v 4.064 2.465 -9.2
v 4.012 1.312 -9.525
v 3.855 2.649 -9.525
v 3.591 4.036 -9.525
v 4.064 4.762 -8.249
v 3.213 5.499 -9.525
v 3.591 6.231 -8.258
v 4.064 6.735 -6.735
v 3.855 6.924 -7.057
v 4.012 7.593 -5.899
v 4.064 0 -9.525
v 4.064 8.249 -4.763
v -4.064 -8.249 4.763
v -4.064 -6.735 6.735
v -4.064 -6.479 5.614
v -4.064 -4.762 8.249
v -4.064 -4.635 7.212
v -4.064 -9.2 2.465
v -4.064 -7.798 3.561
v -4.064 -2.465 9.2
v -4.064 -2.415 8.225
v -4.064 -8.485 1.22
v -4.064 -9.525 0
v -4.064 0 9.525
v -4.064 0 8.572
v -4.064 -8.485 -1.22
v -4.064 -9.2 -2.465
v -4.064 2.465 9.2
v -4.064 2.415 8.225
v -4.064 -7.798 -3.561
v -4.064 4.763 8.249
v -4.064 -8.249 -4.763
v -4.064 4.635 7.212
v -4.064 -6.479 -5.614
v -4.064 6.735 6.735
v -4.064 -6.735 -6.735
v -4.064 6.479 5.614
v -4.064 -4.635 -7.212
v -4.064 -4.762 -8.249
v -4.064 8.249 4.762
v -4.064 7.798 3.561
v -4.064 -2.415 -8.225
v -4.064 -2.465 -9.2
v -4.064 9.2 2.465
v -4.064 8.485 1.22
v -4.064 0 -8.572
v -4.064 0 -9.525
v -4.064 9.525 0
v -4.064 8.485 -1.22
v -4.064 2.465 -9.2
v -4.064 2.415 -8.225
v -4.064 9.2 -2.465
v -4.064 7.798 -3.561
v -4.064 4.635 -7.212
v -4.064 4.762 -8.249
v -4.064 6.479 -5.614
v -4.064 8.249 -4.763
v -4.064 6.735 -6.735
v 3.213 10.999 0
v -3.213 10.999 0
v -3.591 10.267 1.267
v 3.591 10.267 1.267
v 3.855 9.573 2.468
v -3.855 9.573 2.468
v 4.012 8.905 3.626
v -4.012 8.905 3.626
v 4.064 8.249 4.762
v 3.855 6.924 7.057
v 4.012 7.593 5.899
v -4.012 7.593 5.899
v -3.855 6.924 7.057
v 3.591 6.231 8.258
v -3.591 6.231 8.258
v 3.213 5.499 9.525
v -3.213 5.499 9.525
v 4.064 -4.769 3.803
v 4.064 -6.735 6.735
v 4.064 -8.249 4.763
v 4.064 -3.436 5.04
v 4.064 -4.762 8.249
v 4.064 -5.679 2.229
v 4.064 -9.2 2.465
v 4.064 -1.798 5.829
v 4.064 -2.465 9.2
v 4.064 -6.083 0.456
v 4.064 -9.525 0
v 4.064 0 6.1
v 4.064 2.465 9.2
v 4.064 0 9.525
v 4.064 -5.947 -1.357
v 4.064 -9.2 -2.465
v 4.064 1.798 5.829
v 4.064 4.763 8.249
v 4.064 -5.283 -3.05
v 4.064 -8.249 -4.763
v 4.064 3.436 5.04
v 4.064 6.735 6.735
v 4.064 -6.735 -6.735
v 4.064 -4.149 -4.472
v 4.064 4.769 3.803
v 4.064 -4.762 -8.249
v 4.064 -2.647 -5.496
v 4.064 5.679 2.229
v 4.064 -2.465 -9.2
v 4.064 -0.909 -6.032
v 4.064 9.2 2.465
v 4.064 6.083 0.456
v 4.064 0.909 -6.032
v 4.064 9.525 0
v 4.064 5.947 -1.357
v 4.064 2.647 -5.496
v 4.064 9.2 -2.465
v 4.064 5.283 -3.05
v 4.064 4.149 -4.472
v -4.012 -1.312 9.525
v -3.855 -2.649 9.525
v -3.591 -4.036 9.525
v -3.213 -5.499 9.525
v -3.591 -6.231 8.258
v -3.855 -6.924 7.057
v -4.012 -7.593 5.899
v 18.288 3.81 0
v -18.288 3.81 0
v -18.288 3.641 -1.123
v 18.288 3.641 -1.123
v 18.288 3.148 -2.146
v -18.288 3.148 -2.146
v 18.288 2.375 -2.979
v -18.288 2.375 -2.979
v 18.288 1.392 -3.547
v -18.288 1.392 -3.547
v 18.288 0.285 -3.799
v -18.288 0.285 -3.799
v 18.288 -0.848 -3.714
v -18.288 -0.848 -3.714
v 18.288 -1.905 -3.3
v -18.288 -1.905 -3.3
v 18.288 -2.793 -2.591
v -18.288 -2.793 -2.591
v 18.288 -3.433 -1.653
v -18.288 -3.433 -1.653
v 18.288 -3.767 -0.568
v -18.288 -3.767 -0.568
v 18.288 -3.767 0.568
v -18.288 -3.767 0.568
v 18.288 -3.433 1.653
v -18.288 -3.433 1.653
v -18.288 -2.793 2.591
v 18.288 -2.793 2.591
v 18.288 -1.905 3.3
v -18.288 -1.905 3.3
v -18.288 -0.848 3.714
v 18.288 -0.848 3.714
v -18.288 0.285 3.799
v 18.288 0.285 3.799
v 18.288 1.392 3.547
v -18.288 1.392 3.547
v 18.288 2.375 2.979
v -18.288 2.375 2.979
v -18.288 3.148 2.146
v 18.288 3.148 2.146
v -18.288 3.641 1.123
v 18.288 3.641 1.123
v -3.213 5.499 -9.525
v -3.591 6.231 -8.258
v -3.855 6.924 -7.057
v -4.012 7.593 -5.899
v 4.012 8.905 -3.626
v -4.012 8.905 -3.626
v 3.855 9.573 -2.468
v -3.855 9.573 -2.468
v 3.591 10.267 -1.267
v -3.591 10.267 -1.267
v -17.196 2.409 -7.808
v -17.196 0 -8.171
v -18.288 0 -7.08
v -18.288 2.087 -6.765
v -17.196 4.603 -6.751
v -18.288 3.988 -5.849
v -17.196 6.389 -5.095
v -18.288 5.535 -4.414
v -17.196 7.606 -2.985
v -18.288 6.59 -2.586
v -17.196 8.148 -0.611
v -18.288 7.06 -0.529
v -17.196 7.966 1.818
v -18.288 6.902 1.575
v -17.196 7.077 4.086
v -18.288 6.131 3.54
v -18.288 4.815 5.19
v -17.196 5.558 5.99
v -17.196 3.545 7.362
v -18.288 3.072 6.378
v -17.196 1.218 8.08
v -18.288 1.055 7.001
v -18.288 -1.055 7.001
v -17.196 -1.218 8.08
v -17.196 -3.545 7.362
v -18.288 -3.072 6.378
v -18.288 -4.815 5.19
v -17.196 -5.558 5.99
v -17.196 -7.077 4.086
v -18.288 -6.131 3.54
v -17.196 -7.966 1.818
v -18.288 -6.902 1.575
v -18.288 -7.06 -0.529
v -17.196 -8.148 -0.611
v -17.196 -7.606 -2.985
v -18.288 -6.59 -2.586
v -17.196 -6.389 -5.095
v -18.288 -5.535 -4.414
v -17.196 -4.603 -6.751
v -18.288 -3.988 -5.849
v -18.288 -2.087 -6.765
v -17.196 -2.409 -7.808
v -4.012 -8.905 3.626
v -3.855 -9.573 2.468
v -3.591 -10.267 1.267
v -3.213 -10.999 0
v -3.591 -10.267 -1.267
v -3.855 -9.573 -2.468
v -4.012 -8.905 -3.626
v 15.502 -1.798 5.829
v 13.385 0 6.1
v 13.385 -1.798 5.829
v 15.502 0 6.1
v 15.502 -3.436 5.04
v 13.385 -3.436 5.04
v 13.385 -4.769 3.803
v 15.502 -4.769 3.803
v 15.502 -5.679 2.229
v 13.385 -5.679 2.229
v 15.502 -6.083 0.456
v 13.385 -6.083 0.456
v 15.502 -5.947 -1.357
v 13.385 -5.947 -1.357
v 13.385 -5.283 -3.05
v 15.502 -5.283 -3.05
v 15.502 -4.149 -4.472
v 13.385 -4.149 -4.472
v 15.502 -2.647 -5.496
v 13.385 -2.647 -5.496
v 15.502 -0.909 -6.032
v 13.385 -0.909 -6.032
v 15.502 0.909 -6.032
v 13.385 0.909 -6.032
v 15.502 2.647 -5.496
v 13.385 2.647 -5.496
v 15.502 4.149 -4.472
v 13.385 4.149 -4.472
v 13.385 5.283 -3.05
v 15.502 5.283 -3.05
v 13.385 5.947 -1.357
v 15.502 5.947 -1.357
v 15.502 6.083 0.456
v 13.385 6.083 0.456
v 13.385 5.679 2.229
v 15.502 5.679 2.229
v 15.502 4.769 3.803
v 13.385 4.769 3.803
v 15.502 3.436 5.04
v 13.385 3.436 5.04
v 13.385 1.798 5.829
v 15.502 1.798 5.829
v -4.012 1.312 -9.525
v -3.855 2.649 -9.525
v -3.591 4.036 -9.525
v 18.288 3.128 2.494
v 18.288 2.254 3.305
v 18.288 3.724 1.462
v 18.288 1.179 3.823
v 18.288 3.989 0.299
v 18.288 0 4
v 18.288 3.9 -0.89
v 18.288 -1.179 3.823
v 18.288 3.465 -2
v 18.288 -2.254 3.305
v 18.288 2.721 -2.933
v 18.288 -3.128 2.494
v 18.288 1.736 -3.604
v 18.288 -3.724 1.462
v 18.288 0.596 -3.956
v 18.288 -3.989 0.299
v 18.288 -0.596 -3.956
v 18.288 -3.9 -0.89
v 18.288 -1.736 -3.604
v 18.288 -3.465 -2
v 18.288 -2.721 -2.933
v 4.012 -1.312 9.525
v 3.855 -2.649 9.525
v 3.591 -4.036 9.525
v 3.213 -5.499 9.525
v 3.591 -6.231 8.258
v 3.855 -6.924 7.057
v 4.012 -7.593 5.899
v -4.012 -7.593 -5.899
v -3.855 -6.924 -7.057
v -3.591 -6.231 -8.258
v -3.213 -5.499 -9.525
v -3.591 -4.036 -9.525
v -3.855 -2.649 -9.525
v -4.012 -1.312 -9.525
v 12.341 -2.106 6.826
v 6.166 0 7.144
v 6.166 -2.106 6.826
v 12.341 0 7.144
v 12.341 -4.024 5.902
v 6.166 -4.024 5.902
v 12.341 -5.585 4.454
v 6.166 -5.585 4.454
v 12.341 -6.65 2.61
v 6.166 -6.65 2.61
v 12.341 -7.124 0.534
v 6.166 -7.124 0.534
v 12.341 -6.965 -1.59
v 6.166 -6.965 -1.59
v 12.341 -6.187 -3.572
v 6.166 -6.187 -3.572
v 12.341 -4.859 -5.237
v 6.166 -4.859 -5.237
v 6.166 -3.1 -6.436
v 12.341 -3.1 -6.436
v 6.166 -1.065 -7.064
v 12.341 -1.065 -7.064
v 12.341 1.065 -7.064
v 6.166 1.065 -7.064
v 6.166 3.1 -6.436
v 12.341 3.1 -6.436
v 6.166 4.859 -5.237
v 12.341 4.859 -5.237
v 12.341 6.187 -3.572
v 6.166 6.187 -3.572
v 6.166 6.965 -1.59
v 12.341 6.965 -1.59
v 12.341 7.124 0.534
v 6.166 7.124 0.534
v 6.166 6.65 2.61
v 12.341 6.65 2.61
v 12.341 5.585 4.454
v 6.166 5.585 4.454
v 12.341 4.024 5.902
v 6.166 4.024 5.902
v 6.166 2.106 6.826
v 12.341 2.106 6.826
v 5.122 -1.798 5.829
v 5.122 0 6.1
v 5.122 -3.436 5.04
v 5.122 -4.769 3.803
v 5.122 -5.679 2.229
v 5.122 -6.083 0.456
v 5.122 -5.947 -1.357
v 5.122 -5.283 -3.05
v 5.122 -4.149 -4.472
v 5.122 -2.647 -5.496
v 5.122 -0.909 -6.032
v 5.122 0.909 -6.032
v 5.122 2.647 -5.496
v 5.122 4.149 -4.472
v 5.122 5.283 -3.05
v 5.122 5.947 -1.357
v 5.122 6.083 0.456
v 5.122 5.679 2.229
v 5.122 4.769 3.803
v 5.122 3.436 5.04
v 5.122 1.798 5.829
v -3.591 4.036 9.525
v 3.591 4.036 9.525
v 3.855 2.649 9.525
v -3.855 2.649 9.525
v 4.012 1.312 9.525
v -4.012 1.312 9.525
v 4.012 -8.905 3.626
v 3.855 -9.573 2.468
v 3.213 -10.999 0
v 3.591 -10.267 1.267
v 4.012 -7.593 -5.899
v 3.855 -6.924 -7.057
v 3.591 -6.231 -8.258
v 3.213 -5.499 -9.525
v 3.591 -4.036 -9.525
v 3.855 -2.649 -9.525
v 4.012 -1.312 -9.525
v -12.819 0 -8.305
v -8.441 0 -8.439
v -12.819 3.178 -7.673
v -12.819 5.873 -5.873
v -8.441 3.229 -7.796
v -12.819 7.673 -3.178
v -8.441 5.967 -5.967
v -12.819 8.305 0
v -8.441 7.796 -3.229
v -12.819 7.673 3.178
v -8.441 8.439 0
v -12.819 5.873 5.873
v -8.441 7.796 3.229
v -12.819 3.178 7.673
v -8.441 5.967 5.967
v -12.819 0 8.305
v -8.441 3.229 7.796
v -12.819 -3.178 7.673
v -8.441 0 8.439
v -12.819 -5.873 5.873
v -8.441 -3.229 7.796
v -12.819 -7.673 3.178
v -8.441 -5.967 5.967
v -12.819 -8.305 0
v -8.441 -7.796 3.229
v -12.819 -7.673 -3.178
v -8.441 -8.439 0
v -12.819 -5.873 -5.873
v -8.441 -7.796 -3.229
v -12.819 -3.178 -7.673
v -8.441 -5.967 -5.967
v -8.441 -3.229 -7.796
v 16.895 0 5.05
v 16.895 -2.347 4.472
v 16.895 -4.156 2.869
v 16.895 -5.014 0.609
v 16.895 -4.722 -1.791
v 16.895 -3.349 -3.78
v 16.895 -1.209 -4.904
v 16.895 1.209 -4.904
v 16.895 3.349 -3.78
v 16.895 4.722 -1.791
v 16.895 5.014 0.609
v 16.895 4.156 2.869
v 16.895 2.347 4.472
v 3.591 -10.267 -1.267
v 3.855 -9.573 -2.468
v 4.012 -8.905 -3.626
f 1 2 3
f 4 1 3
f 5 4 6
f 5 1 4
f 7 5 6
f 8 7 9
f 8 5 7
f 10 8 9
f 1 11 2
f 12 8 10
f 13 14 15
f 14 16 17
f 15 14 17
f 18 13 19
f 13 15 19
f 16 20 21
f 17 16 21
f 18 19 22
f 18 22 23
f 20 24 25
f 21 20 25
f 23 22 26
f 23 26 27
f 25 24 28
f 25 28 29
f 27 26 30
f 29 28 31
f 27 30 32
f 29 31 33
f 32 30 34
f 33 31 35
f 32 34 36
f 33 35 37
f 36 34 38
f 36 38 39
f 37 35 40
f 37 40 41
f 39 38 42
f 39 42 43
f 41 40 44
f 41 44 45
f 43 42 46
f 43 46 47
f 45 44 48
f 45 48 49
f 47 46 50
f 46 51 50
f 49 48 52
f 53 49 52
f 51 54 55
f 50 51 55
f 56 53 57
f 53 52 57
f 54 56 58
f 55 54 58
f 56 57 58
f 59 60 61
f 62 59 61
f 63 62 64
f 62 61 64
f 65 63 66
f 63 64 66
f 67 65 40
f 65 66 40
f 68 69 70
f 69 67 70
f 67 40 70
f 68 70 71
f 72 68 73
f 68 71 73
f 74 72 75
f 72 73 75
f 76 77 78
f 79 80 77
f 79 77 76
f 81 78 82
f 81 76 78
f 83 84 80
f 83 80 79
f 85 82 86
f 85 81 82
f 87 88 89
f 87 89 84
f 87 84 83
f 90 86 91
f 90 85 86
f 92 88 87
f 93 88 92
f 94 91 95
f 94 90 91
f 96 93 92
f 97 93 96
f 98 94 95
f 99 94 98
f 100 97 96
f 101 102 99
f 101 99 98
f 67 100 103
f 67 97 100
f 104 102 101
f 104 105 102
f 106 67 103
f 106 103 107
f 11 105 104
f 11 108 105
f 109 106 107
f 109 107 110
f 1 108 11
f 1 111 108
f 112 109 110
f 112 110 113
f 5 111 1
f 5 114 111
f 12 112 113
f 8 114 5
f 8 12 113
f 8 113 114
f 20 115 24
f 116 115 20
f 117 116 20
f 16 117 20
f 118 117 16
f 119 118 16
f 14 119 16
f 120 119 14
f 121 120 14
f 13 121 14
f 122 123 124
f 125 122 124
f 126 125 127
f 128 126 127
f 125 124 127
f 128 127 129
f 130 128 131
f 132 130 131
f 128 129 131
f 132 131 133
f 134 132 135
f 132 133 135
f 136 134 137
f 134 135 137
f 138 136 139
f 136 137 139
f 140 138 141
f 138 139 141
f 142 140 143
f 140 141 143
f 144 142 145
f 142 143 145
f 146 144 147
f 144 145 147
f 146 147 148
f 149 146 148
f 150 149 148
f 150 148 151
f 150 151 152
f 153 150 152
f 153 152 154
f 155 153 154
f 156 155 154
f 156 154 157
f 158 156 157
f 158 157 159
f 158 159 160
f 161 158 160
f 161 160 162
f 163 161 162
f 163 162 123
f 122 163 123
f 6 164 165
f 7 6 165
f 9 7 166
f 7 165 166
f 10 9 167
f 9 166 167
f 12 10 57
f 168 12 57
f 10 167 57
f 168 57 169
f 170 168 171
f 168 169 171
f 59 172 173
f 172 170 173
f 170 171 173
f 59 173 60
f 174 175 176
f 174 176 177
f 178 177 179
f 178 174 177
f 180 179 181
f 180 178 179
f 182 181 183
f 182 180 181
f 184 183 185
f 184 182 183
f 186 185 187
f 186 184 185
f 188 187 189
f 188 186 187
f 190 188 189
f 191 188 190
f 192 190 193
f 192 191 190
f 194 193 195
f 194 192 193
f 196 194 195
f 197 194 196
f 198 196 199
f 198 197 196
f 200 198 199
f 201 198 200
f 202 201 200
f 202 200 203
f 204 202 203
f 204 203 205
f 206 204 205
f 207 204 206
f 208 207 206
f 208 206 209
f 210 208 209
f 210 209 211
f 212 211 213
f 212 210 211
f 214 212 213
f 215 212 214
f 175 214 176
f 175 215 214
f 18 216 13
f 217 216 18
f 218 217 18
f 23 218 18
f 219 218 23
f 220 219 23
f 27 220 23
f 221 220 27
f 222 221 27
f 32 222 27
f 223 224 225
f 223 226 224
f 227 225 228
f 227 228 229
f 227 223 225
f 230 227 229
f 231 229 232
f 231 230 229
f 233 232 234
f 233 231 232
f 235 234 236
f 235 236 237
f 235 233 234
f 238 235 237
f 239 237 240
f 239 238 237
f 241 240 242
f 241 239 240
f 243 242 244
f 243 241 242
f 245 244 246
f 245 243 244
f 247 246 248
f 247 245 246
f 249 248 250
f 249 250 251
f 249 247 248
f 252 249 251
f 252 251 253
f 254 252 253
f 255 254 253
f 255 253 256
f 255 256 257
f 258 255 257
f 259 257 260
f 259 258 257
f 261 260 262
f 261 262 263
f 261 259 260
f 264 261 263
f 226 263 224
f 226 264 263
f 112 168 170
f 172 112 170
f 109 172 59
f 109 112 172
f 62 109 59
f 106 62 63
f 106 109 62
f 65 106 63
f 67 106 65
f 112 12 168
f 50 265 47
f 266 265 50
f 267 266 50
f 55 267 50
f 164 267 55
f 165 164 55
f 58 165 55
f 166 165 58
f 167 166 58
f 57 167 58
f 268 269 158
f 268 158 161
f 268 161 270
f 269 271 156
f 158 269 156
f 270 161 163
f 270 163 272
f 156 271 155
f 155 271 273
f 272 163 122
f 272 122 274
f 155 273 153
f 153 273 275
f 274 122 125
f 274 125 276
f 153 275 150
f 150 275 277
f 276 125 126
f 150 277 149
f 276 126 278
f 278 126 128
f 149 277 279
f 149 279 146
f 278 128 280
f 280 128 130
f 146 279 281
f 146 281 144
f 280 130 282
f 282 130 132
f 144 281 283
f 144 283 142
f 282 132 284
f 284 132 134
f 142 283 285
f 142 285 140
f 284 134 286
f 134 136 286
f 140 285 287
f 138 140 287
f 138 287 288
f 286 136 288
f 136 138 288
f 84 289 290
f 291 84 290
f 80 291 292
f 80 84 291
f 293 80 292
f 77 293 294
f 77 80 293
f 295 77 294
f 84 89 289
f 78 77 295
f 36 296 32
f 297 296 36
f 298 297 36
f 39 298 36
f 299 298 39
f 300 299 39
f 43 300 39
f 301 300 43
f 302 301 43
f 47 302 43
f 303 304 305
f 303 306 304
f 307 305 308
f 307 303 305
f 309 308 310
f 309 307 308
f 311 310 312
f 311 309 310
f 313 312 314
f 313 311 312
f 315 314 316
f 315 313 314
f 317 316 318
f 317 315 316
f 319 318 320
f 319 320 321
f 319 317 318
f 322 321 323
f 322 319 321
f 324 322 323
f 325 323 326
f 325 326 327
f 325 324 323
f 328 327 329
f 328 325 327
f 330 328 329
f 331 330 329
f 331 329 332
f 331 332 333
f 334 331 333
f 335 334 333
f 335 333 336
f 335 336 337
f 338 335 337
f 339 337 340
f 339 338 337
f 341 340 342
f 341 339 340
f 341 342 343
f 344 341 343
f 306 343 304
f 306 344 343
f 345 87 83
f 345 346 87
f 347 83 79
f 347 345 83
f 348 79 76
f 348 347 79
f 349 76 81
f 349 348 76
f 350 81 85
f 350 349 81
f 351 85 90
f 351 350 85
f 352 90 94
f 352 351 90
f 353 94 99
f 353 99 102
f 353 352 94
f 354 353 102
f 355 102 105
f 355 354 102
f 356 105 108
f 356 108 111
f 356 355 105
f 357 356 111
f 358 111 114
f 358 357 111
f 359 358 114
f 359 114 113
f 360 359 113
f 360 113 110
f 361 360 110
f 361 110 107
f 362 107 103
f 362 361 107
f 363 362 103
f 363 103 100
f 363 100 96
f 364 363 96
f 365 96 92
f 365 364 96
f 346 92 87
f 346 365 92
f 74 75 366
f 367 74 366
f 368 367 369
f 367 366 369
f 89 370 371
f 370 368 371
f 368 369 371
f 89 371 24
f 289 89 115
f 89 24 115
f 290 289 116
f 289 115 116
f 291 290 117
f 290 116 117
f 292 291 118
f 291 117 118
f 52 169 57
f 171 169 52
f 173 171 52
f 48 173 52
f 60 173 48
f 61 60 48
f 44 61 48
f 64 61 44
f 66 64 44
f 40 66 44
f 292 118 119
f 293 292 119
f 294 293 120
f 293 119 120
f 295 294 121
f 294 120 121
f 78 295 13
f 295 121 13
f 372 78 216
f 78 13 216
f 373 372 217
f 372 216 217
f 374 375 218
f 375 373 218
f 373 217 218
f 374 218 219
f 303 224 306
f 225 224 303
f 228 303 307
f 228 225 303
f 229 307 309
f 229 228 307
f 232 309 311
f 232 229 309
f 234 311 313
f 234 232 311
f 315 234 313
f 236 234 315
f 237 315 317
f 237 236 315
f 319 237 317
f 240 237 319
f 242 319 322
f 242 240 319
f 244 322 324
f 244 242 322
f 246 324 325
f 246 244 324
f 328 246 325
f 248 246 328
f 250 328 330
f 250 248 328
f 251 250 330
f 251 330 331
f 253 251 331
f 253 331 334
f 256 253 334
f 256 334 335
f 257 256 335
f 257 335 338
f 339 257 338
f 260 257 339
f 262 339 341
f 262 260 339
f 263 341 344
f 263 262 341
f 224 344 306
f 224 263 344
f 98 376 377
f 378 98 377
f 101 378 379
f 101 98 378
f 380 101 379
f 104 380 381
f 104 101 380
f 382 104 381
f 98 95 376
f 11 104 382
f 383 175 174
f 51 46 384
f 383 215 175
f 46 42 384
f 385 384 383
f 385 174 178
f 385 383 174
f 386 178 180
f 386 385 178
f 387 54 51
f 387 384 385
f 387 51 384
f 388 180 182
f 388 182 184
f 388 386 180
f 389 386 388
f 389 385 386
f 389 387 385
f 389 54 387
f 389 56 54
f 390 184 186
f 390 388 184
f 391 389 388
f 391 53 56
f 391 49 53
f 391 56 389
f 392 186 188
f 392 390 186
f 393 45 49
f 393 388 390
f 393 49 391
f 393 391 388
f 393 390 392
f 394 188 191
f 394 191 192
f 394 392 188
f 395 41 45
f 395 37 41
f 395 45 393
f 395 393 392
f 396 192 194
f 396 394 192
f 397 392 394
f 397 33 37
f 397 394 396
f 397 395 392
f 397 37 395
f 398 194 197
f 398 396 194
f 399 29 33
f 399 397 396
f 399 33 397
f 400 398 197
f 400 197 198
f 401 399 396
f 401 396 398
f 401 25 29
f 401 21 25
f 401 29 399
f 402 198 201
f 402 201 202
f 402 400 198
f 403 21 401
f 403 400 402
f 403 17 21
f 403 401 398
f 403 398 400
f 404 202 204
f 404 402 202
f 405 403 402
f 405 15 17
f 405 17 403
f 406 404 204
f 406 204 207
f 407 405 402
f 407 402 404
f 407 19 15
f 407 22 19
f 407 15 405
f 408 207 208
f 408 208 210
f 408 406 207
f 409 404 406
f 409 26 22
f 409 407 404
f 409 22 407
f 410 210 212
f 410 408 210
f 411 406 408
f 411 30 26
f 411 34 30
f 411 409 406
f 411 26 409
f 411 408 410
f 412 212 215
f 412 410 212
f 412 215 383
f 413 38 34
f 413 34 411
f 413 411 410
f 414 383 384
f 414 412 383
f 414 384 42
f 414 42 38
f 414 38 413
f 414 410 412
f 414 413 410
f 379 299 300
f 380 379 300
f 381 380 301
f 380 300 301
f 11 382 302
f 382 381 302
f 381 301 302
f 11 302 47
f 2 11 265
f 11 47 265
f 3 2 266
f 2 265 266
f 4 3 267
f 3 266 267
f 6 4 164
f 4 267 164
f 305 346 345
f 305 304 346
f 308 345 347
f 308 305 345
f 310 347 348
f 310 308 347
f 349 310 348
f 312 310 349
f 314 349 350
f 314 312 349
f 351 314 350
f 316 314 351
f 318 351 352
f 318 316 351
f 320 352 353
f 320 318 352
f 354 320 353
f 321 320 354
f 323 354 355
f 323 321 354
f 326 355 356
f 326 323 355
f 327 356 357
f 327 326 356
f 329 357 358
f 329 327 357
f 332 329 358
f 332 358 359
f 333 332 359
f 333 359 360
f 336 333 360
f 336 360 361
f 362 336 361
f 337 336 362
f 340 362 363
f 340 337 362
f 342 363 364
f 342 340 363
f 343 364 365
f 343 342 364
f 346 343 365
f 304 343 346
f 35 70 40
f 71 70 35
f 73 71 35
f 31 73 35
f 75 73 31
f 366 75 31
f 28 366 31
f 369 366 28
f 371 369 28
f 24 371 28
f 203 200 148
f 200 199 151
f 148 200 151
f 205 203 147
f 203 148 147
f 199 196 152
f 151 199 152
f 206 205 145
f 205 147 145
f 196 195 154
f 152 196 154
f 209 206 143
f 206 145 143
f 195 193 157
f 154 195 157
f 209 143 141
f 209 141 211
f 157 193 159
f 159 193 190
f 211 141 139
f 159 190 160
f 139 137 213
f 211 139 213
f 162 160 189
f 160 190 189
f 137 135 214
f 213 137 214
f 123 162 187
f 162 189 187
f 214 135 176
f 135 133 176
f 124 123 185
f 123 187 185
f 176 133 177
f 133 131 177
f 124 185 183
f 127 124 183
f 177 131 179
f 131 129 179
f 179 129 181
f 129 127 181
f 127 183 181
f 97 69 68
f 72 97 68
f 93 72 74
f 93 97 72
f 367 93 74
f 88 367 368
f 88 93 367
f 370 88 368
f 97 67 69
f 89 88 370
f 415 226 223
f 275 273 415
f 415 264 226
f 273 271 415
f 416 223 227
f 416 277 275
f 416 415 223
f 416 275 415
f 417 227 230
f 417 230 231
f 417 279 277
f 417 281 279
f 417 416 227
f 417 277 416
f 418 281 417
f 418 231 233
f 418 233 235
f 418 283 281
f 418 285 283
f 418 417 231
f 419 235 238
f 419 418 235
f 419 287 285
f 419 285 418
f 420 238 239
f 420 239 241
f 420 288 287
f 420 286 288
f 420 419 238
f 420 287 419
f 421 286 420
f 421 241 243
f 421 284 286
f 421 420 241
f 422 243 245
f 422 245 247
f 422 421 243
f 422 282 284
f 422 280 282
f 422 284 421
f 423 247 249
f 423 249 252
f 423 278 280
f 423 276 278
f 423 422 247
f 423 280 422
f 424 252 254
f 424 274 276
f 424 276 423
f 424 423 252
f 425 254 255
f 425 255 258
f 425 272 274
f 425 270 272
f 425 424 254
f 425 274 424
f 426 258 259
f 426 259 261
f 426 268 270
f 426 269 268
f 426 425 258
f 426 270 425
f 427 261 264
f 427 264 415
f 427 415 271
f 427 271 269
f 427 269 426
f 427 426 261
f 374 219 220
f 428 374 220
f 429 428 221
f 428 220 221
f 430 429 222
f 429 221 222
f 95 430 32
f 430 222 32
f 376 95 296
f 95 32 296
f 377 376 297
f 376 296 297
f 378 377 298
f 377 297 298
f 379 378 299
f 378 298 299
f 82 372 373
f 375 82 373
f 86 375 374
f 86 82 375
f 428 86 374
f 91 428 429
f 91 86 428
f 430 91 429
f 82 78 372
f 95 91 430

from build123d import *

# Parameters (mm, degrees)
SKETCH6_W           = 36.576
SKETCH6_H           = 7.14375
EXTRUDE1_DEPTH      = 8.128
SKETCH7_W           = 36.576
SKETCH7_H           = 3.81
SKETCH17_R          = 7.14375
CUT_EXTRUDE1_DEPTH  = 14.224
SKETCH19_R          = 8.5725
BOSS_EXTRUDE1_DEPTH = 14.224
BOSS_EXTRUDE1_DRAFT = -1.75
CHAMFER1_SIZE       = 1.058333333
CHAMFER1_SIZE2      = 1.092196811
SKETCH22_R          = 8.5725
BOSS_EXTRUDE3_DEPTH = 14.224
BOSS_EXTRUDE3_DRAFT = -15
SKETCH23_R          = 3.81
CUT_EXTRUDE2_DEPTH  = 14.224


with BuildPart() as part:
    # Sketch6 → Revolve3 (revolve)
    with BuildSketch(Plane.XY, mode=Mode.PRIVATE) as revolve3_sk:
        with Locations((0, 3.571875)):
            Rectangle(SKETCH6_W, SKETCH6_H)
    revolve(revolve3_sk.sketch.rotate(Axis((-18.288, 0, 0), (1, 0, 0)), 90), axis=Axis((-18.288, 0, 0), (1, 0, 0)))

    # Sketch12 → Extrude1 (add)
    with BuildSketch(Plane(origin=(-4.064, 0, 0), x_dir=(0, 0, -1), z_dir=(1, 0, 0))):
        Polygon((0, 10.998522628), (-9.525, 5.499261314), (-9.525, -5.499261314), (0, -10.998522628), (9.525, -5.499261314), (9.525, 5.499261314), align=None)
    extrude(amount=EXTRUDE1_DEPTH)

    # Sketch10 → Cut-Revolve6 (revolve, cut)
    with BuildSketch(Plane.XY, mode=Mode.PRIVATE) as cut_revolve6_sk:
        Polygon((6.165876886, 7.14375), (4.064, 7.14375), (4.064, 6.100206448), (5.122333333, 6.100206448), align=None)
        Polygon((18.288, 7.14375), (12.341385213, 7.14375), (13.384928765, 6.100206448), (15.501595432, 6.100206448), (18.288, 4.0005), align=None)
    revolve(cut_revolve6_sk.sketch.rotate(Axis((-18.288, 0, 0), (1, 0, 0)), 90), axis=Axis((-18.288, 0, 0), (1, 0, 0)), mode=Mode.SUBTRACT)

    # Sketch7 → Cut-Revolve5 (revolve, cut)
    with BuildSketch(Plane.XY):
        with Locations((0, 1.905)):
            Rectangle(SKETCH7_W, SKETCH7_H)
    revolve(axis=Axis((18.288, 0, 0), (-1, 0, 0)), mode=Mode.SUBTRACT)

    # Sketch13 → Cut-Revolve7 (revolve, cut)
    with BuildSketch(Plane.XY):
        Polygon((-4.064, 10.998522628), (-4.064, 9.525), (-3.213261314, 10.998522628), align=None)
        Polygon((3.213261314, 10.998522628), (4.064, 9.525), (4.064, 10.998522628), align=None)
    revolve(axis=Axis((-18.288, 0, 0), (1, 0, 0)), mode=Mode.SUBTRACT)

    # Sketch17 → Cut-Extrude1 (cut)
    with BuildSketch(Plane.ZY.offset(18.288)):
        Circle(SKETCH17_R)
    extrude(amount=-CUT_EXTRUDE1_DEPTH, mode=Mode.SUBTRACT)


with BuildPart() as body_2:
    # Sketch19 → Boss-Extrude1 (with draft: the straight prism first)
    with BuildSketch(Plane(origin=(-4.064, 0, 0), x_dir=(0, 0, -1), z_dir=(1, 0, 0))):
        Circle(SKETCH19_R)
    extrude(amount=-BOSS_EXTRUDE1_DEPTH)
    # Boss-Extrude1: the draft: its side faces are tilted about the plane it starts from
    boss_extrude1_sides = [body_2.faces().sort_by_distance(p)[0] for p in [
        (-11.176, 0, 8.5725),
    ]]
    draft(boss_extrude1_sides, Plane(origin=(-4.064, 0, 0), x_dir=(0, 0, -1), z_dir=(1, 0, 0)), BOSS_EXTRUDE1_DRAFT)

    # Chamfer1
    chamfer1_edges = [body_2.edges().sort_by_distance(p)[0] for p in [
        (-18.288, 0, 8.137917495),
    ]]
    chamfer1_side = [body_2.faces().sort_by_distance(p)[0] for p in [
        (-18.288, 0, 0),
    ]]
    chamfer(chamfer1_edges, length=CHAMFER1_SIZE, length2=CHAMFER1_SIZE2, reference=chamfer1_side[0])


with BuildPart() as boss_extrude3_tool:
    # Sketch22 → Boss-Extrude3 (with draft: the straight prism first)
    with BuildSketch(Plane(origin=(-4.064, 0, 0), x_dir=(0, 0, -1), z_dir=(1, 0, 0))):
        Circle(SKETCH22_R)
    extrude(amount=-BOSS_EXTRUDE3_DEPTH)
    # Boss-Extrude3: the draft: its side faces are tilted about the plane it starts from
    boss_extrude3_sides = [boss_extrude3_tool.faces().sort_by_distance(p)[0] for p in [
        (-11.176, 0, 8.5725),
    ]]
    draft(boss_extrude3_sides, Plane(origin=(-4.064, 0, 0), x_dir=(0, 0, -1), z_dir=(1, 0, 0)), BOSS_EXTRUDE3_DRAFT)


with BuildPart() as body_2_1:
    add(body_2.part)

    # Boss-Extrude3: add boss_extrude3_tool
    add(boss_extrude3_tool.part)

    # Combine1: union part
    add(part.part)

    # Sketch23 → Cut-Extrude2 (cut)
    with BuildSketch(Plane.ZY.offset(18.288)):
        with Locations(Location((0, 0, 0), (0, 0, 90))):
            Circle(SKETCH23_R)
    extrude(amount=-CUT_EXTRUDE2_DEPTH, mode=Mode.SUBTRACT)


solid = body_2_1.part
